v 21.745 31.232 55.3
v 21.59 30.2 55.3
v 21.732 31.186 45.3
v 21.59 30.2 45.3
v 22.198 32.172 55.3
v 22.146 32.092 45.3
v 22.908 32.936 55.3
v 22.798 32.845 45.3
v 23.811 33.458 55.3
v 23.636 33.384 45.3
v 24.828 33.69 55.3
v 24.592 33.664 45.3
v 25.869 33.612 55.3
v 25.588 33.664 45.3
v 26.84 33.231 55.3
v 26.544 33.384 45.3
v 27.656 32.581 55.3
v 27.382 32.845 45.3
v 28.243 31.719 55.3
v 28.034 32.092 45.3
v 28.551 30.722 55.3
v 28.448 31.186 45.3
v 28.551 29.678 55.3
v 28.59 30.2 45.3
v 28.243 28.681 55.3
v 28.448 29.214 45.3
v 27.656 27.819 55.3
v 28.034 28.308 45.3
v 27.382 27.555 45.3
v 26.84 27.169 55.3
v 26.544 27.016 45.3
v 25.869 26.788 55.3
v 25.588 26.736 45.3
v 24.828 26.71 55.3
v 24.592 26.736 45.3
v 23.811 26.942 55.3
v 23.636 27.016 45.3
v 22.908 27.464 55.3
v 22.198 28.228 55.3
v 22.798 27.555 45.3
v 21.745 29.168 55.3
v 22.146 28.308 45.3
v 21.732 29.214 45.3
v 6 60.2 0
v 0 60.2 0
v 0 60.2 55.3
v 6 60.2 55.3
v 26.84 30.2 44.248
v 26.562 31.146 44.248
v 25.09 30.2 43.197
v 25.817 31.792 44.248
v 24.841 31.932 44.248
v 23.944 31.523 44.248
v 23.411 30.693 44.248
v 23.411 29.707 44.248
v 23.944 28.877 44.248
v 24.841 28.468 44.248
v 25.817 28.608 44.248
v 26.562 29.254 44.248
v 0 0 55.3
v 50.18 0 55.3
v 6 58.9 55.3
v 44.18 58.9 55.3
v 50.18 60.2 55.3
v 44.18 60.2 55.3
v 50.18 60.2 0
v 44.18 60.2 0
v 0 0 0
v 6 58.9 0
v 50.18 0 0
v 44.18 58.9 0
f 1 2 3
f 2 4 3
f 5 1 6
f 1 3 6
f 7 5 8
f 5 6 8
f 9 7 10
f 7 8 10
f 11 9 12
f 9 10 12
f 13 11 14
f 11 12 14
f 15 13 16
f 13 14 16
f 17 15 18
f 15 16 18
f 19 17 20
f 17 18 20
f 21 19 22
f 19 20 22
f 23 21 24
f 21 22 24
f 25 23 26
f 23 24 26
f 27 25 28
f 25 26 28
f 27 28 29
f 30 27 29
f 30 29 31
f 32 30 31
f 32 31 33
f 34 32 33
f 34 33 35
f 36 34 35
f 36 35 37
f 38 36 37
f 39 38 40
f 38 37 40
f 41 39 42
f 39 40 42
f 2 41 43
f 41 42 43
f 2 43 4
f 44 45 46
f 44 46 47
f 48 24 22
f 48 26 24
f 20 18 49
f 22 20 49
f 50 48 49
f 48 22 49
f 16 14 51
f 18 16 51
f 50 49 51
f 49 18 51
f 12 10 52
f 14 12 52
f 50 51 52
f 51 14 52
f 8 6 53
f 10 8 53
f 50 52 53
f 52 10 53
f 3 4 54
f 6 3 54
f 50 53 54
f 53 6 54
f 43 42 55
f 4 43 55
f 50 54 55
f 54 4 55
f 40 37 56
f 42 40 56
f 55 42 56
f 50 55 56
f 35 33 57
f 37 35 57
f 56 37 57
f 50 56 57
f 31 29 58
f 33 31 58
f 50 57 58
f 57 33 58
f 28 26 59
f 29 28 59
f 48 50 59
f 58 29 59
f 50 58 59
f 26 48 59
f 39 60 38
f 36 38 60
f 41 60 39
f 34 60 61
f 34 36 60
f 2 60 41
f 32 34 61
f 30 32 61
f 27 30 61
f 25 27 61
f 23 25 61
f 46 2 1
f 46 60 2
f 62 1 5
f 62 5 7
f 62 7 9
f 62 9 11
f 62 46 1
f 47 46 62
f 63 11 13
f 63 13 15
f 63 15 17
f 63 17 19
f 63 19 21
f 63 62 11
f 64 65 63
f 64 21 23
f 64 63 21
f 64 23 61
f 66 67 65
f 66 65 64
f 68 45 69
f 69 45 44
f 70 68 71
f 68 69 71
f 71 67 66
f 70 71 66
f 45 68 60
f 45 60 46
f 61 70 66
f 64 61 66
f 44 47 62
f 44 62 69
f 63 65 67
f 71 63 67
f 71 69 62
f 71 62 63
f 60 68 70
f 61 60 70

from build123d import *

# Parameters (mm, degrees)
SKETCH1_W                 = 50.18
SKETCH1_H                 = 60.2
BOSS_EXTRUDE1_DEPTH       = 55.3
SKETCH2_W                 = 38.18
SKETCH2_H                 = 55.3
CUT_EXTRUDE1_DEPTH        = 1.3
M8X1_0_TAPPED_HOLE1_D     = 7
M8X1_0_TAPPED_HOLE1_DEPTH = 10
M8X1_0_TAPPED_HOLE1_TIP   = 2.103012167


with BuildPart() as part:
    # Sketch1 → Boss-Extrude1 (new body)
    with BuildSketch(Plane.XY):
        with Locations((25.09, 30.1)):
            Rectangle(SKETCH1_W, SKETCH1_H)
    extrude(amount=BOSS_EXTRUDE1_DEPTH)

    # Sketch2 → Cut-Extrude1 (cut)
    with BuildSketch(Plane(origin=(0, 60.2, 0), x_dir=(1, 0, 0), z_dir=(0, 1, 0))):
        with Locations((25.09, -27.65)):
            Rectangle(SKETCH2_W, SKETCH2_H)
    extrude(amount=-CUT_EXTRUDE1_DEPTH, mode=Mode.SUBTRACT)

    # M8x1.0 Tapped Hole1
    with Locations(Plane.XY.offset(55.3)):
        with Locations((25.09, 30.2)):
            Hole(M8X1_0_TAPPED_HOLE1_D / 2, depth=M8X1_0_TAPPED_HOLE1_DEPTH)
            with Locations((0, 0, -(M8X1_0_TAPPED_HOLE1_DEPTH + M8X1_0_TAPPED_HOLE1_TIP / 2))):  # 118° drill point
                Cone(0, M8X1_0_TAPPED_HOLE1_D / 2, M8X1_0_TAPPED_HOLE1_TIP, mode=Mode.SUBTRACT)


solid = part.part
